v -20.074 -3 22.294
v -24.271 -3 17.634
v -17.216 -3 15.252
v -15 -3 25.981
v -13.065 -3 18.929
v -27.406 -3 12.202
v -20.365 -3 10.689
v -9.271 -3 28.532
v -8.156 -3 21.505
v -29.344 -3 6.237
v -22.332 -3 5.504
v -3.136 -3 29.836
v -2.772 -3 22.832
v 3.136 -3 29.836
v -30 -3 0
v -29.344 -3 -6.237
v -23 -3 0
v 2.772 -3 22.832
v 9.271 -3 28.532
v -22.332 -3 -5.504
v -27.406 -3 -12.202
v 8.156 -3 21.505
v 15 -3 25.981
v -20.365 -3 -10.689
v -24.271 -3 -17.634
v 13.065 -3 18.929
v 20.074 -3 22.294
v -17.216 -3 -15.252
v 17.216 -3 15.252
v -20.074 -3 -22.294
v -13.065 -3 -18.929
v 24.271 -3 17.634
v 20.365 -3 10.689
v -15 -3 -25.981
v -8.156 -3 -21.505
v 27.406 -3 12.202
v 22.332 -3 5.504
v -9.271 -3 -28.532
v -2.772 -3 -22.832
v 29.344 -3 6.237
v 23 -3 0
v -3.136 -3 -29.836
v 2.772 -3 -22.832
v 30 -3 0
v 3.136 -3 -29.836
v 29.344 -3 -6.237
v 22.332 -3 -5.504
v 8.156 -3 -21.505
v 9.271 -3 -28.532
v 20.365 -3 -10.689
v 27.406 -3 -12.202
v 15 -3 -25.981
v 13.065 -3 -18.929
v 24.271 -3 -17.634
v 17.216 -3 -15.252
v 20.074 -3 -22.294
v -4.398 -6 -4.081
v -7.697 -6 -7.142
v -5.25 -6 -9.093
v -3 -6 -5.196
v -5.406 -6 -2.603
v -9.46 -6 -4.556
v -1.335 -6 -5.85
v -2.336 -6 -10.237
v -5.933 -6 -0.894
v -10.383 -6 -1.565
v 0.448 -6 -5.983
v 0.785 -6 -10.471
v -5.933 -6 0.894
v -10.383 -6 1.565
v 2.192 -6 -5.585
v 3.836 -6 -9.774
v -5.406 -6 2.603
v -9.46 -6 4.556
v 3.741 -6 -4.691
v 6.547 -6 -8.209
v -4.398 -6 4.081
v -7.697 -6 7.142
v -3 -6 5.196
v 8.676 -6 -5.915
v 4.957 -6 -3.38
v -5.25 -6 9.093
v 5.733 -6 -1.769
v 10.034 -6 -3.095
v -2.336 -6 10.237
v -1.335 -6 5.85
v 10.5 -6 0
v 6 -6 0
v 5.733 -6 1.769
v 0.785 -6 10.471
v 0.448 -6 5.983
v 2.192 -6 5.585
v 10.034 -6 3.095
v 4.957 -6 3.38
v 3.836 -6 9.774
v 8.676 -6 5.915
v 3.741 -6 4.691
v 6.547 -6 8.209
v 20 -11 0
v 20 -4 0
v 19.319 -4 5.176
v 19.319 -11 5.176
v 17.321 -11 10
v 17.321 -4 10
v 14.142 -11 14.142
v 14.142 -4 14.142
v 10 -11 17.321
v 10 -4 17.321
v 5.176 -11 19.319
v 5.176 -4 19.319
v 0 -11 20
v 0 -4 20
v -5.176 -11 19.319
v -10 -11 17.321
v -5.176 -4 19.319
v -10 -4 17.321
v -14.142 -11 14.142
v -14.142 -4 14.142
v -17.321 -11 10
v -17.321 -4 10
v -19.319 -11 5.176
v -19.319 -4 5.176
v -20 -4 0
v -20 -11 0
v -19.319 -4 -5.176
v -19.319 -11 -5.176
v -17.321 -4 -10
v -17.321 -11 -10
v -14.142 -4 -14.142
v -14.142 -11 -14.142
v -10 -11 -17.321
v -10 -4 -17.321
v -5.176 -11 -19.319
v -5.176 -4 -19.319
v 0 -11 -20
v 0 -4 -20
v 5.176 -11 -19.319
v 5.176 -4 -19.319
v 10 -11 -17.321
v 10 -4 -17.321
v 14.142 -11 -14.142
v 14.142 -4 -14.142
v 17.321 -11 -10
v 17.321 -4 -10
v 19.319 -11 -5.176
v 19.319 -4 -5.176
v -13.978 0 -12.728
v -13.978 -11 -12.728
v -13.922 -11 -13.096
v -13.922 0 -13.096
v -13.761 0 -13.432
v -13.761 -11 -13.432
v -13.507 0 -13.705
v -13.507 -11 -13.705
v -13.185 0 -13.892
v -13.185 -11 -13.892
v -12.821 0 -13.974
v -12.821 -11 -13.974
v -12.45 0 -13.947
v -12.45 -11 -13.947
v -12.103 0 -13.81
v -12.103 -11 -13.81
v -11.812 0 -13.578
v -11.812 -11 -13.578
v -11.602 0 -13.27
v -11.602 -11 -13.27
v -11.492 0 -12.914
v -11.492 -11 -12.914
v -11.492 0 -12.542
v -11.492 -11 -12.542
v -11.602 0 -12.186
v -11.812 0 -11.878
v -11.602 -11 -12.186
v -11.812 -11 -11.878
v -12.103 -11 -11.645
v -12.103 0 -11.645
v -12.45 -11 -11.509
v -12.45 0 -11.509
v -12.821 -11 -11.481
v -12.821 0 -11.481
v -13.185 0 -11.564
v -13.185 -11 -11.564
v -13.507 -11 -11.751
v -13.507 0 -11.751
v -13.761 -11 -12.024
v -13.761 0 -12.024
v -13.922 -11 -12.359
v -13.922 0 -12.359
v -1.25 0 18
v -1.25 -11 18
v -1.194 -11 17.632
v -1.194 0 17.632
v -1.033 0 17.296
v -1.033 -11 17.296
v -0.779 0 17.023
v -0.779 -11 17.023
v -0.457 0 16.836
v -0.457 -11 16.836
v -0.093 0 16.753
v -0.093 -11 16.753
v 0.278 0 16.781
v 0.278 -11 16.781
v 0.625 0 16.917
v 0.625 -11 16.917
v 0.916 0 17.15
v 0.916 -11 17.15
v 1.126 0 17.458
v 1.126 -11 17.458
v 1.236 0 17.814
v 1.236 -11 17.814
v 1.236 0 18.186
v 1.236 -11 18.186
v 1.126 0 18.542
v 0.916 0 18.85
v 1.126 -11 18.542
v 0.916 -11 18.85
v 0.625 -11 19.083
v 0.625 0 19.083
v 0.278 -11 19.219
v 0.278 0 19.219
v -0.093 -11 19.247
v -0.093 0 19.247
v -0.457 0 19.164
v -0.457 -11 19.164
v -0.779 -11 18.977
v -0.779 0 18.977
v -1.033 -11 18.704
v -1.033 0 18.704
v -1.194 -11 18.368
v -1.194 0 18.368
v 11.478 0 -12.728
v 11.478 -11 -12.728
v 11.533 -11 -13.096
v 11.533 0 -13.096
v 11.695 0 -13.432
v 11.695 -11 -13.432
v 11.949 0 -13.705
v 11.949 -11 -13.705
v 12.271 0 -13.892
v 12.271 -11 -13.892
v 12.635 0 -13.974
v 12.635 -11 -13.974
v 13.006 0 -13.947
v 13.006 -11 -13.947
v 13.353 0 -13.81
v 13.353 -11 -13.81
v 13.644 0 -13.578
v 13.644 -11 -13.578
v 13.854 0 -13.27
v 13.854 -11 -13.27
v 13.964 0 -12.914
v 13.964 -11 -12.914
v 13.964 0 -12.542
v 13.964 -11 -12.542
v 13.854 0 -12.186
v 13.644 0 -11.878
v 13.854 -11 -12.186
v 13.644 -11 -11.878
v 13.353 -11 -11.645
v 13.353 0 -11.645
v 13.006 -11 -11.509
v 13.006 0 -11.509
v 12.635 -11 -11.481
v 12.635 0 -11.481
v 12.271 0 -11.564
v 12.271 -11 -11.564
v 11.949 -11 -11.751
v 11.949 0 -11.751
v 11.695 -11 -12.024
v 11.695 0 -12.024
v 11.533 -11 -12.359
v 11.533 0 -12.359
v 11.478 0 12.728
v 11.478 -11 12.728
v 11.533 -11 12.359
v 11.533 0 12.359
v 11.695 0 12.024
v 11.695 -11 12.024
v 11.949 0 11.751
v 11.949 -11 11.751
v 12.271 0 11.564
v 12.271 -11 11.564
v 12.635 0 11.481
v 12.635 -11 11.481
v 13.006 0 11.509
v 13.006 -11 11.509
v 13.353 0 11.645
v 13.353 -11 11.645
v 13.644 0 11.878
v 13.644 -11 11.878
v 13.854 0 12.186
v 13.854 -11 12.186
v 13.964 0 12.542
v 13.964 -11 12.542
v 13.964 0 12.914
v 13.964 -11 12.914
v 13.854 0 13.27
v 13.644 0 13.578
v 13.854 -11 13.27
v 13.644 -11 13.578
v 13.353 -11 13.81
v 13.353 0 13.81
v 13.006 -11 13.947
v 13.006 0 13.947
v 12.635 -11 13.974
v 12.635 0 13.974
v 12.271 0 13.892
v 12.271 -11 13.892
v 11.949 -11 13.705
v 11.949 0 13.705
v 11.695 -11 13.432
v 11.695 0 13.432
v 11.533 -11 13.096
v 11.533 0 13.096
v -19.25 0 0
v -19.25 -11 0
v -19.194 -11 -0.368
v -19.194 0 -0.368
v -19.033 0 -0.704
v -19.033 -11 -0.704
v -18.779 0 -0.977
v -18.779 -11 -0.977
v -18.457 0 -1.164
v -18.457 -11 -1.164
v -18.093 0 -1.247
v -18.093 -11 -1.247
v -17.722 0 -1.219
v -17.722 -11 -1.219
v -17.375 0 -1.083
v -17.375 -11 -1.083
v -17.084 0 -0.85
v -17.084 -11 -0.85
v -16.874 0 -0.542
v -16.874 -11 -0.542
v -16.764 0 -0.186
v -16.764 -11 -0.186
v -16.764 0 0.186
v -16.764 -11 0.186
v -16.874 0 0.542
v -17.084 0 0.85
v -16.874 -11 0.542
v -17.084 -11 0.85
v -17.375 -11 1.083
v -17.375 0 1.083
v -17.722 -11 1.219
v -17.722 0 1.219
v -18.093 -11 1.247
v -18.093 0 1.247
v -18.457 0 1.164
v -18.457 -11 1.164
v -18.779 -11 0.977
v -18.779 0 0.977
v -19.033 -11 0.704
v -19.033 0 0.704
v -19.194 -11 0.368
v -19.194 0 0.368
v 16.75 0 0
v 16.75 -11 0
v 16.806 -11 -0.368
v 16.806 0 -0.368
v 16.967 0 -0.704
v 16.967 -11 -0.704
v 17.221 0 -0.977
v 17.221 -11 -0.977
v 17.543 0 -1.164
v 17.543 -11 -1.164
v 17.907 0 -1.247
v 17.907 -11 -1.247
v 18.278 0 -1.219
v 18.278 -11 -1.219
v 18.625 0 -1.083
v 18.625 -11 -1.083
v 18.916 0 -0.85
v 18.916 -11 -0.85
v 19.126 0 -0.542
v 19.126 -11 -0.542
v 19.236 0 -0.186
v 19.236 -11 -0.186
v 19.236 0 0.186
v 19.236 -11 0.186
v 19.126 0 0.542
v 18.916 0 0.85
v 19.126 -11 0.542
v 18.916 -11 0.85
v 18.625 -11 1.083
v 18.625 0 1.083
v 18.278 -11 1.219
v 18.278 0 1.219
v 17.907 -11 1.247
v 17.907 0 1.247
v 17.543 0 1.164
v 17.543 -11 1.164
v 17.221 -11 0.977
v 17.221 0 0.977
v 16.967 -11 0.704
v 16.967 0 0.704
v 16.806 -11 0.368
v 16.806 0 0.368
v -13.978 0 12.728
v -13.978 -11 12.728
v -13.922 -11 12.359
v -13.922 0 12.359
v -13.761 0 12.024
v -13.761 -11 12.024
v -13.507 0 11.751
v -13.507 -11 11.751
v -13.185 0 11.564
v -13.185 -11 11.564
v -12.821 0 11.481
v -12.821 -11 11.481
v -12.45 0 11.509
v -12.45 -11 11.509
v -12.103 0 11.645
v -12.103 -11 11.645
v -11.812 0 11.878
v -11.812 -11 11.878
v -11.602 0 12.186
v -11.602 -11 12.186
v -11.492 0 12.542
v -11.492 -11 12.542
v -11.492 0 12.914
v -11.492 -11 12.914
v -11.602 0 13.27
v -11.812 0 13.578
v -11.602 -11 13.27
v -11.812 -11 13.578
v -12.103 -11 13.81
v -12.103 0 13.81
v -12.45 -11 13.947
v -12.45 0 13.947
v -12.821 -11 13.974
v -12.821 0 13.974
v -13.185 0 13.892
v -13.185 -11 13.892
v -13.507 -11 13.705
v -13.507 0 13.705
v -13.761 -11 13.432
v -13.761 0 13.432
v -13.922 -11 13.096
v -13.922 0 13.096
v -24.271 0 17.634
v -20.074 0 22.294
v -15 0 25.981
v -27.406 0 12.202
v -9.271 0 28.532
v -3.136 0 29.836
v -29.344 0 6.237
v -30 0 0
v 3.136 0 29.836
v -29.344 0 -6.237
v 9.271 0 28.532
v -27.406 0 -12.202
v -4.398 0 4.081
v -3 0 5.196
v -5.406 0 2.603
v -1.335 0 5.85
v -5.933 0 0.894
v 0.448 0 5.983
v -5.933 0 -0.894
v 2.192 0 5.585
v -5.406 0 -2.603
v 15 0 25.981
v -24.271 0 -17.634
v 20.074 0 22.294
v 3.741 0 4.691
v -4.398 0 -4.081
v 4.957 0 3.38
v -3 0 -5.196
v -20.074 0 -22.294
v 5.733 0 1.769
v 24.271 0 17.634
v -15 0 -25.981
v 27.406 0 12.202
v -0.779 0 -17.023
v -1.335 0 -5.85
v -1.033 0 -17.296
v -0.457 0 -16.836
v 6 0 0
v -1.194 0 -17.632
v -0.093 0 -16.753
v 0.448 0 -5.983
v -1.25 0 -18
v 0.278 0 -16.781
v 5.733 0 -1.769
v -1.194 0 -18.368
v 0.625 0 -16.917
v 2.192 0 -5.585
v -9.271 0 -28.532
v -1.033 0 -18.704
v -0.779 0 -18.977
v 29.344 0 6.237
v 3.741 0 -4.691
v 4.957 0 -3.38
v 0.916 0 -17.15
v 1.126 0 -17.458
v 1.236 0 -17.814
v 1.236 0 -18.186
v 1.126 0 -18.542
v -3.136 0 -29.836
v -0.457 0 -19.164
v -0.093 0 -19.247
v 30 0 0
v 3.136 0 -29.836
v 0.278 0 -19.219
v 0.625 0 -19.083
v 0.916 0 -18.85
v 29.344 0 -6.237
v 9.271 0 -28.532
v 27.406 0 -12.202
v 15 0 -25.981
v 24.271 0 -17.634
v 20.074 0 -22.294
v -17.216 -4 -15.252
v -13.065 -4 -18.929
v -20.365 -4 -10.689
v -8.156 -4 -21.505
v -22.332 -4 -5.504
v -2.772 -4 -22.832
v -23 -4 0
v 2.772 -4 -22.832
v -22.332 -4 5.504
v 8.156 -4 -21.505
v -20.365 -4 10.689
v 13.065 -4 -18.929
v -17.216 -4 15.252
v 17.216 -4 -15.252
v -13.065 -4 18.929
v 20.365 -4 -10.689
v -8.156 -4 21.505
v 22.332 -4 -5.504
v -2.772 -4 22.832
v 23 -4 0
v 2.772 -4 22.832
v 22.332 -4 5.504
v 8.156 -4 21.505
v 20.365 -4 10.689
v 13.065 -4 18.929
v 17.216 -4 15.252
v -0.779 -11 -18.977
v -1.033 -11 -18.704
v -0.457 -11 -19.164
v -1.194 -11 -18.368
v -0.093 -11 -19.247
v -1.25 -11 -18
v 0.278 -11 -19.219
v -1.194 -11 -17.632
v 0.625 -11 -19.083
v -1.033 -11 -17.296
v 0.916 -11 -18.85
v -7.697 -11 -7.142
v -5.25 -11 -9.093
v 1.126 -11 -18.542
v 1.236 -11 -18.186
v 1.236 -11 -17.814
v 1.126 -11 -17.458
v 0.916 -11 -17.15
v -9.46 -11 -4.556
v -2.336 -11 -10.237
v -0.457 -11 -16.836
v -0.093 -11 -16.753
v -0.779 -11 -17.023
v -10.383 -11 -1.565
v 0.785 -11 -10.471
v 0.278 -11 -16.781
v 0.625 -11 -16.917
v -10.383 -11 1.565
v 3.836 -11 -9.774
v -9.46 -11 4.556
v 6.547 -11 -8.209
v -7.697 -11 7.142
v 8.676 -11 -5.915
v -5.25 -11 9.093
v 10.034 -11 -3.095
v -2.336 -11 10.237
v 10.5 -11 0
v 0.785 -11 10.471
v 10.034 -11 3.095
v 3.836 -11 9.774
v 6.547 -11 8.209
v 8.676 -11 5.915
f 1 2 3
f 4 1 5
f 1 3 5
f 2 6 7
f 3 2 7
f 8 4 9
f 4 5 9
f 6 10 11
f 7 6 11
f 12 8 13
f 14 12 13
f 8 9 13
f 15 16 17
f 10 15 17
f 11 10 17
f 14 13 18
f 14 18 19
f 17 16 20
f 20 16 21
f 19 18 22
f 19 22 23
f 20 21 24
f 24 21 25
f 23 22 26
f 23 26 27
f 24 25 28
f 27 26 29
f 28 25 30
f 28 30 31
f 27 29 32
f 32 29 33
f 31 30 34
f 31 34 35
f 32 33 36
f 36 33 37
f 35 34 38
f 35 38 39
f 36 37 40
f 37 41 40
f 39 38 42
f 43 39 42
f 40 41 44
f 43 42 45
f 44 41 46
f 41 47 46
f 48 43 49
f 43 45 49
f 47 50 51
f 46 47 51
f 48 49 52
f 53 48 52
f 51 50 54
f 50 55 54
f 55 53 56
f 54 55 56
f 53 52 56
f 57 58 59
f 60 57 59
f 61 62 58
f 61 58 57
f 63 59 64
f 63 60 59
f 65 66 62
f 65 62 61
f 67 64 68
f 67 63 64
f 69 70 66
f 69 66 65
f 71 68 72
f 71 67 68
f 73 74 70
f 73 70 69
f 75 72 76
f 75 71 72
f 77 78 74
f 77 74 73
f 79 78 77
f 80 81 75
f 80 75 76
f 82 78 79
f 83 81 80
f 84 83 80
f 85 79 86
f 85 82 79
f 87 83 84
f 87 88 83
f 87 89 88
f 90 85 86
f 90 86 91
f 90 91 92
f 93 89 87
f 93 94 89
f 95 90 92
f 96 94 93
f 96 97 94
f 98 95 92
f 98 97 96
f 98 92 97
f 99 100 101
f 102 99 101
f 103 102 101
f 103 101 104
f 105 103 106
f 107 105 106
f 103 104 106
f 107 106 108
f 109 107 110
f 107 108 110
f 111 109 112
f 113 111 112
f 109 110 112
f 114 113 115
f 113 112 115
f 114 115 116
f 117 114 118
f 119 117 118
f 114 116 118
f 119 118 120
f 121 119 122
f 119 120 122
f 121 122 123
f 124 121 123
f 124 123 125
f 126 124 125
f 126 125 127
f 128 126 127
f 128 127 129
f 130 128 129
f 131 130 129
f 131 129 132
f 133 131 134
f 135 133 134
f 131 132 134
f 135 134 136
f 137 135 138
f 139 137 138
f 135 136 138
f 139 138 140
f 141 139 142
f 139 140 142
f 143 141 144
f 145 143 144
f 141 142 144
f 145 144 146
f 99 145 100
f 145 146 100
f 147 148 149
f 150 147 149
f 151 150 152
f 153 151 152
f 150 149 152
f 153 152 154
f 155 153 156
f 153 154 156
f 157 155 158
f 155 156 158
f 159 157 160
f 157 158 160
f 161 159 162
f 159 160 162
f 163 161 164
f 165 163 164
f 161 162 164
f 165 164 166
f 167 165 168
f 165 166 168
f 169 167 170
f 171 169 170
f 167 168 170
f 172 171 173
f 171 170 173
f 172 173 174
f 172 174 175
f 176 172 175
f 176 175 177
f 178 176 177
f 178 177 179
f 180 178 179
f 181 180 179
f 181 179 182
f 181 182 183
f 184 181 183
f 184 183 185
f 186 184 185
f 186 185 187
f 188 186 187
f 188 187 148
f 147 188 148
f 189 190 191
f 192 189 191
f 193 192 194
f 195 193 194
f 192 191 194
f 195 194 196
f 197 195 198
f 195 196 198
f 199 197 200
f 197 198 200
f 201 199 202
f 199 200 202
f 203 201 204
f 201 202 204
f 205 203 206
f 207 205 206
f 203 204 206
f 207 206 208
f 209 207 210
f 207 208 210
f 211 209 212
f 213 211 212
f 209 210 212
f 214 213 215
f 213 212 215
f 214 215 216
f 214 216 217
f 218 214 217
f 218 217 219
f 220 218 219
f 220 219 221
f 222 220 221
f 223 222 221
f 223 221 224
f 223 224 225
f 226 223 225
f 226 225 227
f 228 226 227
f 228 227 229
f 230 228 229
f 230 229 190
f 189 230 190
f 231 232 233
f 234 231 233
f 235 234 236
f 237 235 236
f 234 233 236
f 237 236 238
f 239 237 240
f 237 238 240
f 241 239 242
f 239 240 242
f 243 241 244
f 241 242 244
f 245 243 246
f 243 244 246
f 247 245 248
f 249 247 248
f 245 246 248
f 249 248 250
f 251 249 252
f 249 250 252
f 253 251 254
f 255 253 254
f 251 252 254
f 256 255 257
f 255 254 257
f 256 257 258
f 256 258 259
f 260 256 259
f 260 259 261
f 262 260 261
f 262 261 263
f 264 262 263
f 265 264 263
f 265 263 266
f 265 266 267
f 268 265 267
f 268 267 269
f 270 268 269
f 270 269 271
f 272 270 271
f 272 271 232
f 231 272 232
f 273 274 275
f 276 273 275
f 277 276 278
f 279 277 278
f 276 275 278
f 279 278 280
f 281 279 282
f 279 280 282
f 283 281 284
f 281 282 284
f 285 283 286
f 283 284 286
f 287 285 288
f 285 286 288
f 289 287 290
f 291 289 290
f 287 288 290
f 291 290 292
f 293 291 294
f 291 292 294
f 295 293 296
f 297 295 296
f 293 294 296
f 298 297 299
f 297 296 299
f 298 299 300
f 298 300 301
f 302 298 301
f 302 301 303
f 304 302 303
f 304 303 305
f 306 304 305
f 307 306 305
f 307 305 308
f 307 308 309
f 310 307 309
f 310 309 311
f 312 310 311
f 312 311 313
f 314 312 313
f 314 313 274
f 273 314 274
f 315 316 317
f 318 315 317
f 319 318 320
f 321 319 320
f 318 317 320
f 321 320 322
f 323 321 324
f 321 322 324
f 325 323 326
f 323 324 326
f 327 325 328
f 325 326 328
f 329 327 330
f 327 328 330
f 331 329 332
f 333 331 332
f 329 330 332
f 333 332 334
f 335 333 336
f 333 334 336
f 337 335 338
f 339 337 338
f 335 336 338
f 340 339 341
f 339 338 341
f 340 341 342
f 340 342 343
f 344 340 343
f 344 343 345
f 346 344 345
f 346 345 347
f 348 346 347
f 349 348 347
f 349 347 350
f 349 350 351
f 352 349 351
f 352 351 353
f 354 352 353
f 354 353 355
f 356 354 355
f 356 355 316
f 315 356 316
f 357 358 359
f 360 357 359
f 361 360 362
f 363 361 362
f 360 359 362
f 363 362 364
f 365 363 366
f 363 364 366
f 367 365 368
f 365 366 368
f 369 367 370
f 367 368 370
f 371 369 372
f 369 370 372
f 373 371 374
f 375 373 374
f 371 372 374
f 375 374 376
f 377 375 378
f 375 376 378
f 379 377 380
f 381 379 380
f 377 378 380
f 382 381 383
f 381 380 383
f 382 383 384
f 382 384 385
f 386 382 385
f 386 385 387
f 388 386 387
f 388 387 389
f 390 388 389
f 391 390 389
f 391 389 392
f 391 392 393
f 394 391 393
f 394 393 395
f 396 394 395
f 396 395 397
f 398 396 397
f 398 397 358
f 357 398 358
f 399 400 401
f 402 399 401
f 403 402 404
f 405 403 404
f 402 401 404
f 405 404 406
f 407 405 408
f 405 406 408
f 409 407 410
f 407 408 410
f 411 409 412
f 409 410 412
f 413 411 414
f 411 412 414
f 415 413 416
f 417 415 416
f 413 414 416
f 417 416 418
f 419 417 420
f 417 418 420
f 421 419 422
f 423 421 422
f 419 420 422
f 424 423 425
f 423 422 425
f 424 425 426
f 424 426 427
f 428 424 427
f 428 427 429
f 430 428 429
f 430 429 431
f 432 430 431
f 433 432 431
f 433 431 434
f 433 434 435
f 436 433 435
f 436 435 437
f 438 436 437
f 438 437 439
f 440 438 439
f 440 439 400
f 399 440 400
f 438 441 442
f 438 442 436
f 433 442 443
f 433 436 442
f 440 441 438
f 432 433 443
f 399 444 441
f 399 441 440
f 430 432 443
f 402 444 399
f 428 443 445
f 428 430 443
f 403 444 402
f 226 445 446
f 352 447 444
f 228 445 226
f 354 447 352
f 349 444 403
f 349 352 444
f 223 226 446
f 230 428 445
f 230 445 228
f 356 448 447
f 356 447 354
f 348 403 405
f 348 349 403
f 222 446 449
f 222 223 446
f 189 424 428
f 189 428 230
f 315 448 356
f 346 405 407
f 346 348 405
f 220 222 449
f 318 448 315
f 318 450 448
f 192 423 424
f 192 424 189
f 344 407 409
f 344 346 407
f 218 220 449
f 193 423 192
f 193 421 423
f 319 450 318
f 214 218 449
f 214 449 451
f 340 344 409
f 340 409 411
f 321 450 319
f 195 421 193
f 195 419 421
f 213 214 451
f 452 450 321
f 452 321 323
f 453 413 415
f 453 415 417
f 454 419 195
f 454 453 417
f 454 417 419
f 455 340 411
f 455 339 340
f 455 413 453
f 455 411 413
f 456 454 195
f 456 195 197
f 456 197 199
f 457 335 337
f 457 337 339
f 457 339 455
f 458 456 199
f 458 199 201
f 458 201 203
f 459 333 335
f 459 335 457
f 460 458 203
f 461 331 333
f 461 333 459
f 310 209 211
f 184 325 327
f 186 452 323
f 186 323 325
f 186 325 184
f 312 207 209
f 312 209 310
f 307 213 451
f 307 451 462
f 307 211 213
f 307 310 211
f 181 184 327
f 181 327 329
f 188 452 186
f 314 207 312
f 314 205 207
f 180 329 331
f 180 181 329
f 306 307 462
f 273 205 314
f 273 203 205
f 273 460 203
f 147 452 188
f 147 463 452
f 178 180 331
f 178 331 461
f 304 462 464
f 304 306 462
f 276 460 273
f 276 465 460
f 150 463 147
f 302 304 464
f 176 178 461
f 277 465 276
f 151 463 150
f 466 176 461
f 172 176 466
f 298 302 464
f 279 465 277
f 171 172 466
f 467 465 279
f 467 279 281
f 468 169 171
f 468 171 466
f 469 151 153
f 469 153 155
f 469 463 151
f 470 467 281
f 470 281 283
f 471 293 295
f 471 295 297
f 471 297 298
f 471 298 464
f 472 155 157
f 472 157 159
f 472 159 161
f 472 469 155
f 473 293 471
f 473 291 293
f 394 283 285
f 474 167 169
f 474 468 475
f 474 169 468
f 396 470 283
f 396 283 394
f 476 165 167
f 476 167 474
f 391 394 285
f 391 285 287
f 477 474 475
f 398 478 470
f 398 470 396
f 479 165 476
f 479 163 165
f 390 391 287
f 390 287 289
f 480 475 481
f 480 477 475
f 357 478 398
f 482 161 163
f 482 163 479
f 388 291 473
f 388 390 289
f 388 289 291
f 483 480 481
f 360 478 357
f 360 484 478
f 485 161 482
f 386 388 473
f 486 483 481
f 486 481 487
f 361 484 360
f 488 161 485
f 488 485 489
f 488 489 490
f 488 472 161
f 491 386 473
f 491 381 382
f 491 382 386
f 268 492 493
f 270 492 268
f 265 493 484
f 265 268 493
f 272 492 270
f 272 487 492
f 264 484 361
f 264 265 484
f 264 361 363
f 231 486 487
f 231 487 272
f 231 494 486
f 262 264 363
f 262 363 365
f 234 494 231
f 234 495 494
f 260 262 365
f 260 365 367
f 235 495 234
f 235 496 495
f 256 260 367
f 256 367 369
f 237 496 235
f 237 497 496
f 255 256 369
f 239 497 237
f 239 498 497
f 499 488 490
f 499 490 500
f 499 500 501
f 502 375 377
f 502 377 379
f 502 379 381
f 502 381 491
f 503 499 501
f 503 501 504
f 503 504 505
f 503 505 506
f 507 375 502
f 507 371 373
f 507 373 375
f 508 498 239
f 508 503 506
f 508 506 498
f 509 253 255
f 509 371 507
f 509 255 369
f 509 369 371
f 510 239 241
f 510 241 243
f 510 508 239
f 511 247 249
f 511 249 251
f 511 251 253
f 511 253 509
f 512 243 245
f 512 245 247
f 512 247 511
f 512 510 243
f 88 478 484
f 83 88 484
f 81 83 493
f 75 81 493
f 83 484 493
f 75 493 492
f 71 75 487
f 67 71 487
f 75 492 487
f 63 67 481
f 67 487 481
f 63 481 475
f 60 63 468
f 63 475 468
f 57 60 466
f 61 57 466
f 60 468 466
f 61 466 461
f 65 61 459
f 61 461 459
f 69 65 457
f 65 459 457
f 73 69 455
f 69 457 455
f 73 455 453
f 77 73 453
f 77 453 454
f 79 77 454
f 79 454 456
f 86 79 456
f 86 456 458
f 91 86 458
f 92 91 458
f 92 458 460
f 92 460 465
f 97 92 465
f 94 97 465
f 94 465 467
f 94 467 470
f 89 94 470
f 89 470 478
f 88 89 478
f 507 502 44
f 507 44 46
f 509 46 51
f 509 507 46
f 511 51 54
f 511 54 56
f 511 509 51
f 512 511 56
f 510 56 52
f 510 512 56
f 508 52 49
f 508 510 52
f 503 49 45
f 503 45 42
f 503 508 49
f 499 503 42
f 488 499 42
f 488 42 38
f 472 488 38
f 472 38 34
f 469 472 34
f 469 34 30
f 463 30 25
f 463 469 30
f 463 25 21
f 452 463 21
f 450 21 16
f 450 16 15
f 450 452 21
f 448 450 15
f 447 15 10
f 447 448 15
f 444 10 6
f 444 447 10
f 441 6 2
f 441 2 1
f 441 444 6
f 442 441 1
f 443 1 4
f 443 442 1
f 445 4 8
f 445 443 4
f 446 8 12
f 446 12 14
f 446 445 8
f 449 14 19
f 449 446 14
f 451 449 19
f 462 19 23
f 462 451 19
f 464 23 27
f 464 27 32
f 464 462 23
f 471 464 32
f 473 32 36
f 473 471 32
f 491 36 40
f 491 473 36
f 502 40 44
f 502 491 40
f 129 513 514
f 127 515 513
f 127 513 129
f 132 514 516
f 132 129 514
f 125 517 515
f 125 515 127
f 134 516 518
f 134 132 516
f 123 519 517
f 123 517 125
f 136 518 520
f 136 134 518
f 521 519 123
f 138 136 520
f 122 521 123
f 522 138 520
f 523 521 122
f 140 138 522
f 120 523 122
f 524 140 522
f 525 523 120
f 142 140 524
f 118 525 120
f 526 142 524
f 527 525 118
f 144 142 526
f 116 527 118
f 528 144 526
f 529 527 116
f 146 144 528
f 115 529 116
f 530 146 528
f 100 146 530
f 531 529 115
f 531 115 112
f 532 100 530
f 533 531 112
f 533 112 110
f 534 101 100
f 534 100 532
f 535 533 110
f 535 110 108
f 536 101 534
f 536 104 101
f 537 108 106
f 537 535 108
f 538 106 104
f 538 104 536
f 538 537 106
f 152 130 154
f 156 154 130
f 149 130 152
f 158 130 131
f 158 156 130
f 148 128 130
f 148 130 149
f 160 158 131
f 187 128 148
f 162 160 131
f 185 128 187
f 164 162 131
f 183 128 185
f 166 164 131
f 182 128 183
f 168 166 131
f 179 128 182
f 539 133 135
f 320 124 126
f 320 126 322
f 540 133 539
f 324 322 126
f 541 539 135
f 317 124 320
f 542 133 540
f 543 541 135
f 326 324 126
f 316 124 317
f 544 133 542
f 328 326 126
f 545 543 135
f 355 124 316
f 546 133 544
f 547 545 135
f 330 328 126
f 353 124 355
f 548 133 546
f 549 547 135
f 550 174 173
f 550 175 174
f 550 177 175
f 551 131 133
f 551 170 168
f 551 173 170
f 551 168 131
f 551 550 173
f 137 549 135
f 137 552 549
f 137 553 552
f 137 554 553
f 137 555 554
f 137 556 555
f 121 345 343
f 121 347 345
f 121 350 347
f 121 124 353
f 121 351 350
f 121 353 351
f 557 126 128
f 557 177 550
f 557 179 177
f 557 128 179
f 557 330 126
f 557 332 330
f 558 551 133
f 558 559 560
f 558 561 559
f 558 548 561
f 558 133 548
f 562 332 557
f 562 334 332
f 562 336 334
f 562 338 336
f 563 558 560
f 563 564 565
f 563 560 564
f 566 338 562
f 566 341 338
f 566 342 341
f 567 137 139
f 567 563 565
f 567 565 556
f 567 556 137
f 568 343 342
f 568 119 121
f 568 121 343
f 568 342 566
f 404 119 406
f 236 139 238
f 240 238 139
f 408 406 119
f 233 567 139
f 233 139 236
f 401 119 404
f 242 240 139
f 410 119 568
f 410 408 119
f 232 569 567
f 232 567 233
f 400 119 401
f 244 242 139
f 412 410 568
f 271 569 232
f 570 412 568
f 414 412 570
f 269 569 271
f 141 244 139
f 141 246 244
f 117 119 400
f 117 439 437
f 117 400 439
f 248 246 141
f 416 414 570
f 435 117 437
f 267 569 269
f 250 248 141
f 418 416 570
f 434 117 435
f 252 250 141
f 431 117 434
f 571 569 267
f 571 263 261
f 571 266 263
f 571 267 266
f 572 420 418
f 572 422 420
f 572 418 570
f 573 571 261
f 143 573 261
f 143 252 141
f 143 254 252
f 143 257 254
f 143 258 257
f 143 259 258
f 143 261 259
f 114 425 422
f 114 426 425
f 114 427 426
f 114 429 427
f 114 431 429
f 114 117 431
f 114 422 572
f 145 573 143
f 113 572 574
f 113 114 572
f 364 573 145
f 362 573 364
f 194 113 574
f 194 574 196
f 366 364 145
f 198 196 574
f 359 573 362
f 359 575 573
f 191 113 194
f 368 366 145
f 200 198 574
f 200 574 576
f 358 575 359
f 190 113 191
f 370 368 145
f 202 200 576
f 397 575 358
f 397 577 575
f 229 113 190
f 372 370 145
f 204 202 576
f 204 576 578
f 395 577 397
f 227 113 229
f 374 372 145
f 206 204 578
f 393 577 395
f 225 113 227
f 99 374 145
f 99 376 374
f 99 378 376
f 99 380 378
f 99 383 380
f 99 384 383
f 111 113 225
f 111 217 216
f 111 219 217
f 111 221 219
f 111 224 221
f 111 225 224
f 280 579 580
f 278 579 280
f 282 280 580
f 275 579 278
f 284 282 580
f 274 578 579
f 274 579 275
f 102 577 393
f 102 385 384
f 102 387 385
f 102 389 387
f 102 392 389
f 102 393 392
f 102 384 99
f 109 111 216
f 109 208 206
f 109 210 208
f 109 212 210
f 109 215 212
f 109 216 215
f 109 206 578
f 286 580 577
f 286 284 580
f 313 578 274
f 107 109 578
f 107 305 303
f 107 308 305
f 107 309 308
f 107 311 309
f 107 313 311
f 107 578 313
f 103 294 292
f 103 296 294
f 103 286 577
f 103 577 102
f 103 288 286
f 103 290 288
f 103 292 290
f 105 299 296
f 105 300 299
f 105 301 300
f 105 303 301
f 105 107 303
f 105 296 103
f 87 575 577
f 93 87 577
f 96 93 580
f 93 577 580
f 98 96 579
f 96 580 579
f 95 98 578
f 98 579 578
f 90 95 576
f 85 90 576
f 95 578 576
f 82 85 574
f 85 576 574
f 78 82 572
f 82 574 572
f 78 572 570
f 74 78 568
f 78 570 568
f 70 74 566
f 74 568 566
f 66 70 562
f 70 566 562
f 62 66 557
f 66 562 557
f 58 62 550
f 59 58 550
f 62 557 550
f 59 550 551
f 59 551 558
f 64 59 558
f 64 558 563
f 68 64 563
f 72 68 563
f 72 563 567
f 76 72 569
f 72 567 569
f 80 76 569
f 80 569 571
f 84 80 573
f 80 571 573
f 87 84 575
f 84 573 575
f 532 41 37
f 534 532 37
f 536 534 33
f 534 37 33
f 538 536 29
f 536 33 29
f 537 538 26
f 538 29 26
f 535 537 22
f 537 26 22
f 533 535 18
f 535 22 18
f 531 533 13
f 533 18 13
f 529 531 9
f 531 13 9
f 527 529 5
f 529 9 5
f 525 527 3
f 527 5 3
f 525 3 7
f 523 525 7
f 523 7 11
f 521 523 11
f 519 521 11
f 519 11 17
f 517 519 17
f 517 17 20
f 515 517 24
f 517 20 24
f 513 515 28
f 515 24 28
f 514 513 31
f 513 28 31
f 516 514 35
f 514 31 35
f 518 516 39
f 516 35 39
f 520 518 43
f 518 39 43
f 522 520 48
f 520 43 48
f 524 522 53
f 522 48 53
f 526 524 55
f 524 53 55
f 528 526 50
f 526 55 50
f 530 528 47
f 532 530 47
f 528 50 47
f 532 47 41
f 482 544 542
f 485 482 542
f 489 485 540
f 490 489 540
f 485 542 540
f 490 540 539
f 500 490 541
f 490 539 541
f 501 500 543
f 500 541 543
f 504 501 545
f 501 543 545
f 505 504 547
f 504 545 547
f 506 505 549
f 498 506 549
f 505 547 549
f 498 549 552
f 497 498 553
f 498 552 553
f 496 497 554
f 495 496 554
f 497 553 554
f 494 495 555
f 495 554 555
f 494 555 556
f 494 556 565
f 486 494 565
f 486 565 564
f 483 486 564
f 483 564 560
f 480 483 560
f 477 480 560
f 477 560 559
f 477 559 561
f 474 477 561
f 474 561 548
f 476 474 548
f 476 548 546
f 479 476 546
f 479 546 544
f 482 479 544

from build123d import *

# Parameters (mm, degrees)
SKETCH1_R             = 30
BOSS_EXTRUDE1_DEPTH   = 3
SKETCH2_R             = 23
BOSS_EXTRUDE2_DEPTH   = 1
SKETCH3_R             = 20
BOSS_EXTRUDE3_DEPTH   = 7
SKETCH12_R            = 10.5
CUT_EXTRUDE1_DEPTH    = 5
SKETCH16_R            = 6
CUT_EXTRUDE2_DEPTH    = 12
M3_TAPPED_HOLE1_D     = 2.5
M3_TAPPED_HOLE1_DEPTH = 29.248924226
M3_TAPPED_HOLE1_TIP   = 0.751075774


with BuildPart() as part:
    # Sketch1 → Boss-Extrude1 (new body)
    with BuildSketch(Plane(origin=(0, 0, 0), x_dir=(1, 0, 0), z_dir=(0, 1, 0))):
        Circle(SKETCH1_R)
    extrude(amount=-BOSS_EXTRUDE1_DEPTH)

    # Sketch2 → Boss-Extrude2 (add)
    with BuildSketch(Plane.XZ.offset(3)):
        Circle(SKETCH2_R)
    extrude(amount=BOSS_EXTRUDE2_DEPTH)

    # Sketch3 → Boss-Extrude3 (add)
    with BuildSketch(Plane.XZ.offset(4)):
        Circle(SKETCH3_R)
    extrude(amount=BOSS_EXTRUDE3_DEPTH)

    # Sketch12 → Cut-Extrude1 (cut)
    with BuildSketch(Plane.XZ.offset(11)):
        Circle(SKETCH12_R)
    extrude(amount=-CUT_EXTRUDE1_DEPTH, mode=Mode.SUBTRACT)

    # Sketch16 → Cut-Extrude2 (cut, through all)
    with BuildSketch(Plane(origin=(0, 0, 0), x_dir=(1, 0, 0), z_dir=(0, 1, 0))):
        Circle(SKETCH16_R)
    extrude(amount=-CUT_EXTRUDE2_DEPTH, mode=Mode.SUBTRACT)

    # M3 Tapped Hole1
    with Locations(Plane(origin=(0, 0, 0), x_dir=(1, 0, 0), z_dir=(0, 1, 0))):
        with Locations((-12.727922061, 12.727922061), (0, 18), (12.727922061, 12.727922061), (18, 0), (12.727922061, -12.727922061), (0, -18), (-12.727922061, -12.727922061), (-18, 0)):
            Hole(M3_TAPPED_HOLE1_D / 2, depth=M3_TAPPED_HOLE1_DEPTH)
            with Locations((0, 0, -(M3_TAPPED_HOLE1_DEPTH + M3_TAPPED_HOLE1_TIP / 2))):  # 118° drill point
                Cone(0, M3_TAPPED_HOLE1_D / 2, M3_TAPPED_HOLE1_TIP, mode=Mode.SUBTRACT)


solid = part.part
